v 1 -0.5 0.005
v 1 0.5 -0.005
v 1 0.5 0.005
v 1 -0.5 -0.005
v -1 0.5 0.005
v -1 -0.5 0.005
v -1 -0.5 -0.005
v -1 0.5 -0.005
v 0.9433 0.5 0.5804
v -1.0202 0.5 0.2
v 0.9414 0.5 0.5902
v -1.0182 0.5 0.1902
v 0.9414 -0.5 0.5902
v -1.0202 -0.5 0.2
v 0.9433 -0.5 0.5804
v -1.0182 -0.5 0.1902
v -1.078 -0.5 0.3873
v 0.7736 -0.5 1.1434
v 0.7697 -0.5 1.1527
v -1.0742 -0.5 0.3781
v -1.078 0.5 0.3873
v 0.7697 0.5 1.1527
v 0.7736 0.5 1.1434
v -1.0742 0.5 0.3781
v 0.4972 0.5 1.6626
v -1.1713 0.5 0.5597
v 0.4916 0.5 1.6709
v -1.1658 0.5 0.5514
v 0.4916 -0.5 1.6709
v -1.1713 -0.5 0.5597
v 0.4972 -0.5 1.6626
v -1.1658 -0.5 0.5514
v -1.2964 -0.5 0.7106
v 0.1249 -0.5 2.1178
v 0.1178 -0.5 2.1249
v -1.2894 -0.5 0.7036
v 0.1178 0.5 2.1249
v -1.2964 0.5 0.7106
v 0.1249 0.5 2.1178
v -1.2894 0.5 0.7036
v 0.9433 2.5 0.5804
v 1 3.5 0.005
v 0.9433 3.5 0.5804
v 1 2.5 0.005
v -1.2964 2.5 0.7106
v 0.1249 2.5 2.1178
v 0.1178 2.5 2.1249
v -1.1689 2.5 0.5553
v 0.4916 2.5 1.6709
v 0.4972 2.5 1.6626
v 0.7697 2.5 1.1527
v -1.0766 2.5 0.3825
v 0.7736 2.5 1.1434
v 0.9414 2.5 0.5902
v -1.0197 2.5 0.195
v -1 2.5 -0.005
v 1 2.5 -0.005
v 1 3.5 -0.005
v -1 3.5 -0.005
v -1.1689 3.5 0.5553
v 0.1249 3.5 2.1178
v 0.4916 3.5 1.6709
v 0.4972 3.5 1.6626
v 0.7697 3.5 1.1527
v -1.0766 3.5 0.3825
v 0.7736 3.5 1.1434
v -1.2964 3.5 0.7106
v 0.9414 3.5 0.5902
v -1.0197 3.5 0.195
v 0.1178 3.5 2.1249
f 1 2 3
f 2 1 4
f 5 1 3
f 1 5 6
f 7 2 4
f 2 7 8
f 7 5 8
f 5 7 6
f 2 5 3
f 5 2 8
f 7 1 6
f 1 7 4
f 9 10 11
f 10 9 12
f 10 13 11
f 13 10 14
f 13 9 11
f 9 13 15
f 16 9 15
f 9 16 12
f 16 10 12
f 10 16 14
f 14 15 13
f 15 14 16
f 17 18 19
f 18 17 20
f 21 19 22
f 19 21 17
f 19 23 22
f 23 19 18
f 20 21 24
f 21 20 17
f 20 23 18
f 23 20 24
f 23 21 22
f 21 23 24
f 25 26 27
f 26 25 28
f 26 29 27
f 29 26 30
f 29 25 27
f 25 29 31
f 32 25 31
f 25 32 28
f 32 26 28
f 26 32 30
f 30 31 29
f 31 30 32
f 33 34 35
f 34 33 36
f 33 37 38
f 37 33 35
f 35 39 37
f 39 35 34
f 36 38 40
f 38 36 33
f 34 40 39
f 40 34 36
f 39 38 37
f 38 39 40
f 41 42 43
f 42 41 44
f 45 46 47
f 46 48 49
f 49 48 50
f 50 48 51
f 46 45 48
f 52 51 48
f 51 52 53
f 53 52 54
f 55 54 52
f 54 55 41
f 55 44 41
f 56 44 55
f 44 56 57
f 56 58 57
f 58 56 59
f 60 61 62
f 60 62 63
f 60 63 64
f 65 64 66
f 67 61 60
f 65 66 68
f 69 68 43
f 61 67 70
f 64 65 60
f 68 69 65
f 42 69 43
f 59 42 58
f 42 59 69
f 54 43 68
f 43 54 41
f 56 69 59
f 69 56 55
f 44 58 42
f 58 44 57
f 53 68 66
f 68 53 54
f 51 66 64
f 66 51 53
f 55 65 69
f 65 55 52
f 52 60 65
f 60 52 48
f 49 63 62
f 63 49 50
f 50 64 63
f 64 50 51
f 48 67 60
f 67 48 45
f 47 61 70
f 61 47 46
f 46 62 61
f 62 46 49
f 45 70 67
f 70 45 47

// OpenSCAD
use <../polychannel.scad>

// Note: all examples use relative coordinates to specify shape positions.

eps = 0.01;
width = 2;
height = 1;

params_arc = [
    each arc_xz("cube", [width, height, eps], radius=2, angle1=0, delta_angle=45, n=4),
];
translate([0, 0, 0]) {
    polychannel(params_arc, clr="Salmon", show_only_shapes=true);
    translate([0, 3, 0]) polychannel(params_arc);
};
